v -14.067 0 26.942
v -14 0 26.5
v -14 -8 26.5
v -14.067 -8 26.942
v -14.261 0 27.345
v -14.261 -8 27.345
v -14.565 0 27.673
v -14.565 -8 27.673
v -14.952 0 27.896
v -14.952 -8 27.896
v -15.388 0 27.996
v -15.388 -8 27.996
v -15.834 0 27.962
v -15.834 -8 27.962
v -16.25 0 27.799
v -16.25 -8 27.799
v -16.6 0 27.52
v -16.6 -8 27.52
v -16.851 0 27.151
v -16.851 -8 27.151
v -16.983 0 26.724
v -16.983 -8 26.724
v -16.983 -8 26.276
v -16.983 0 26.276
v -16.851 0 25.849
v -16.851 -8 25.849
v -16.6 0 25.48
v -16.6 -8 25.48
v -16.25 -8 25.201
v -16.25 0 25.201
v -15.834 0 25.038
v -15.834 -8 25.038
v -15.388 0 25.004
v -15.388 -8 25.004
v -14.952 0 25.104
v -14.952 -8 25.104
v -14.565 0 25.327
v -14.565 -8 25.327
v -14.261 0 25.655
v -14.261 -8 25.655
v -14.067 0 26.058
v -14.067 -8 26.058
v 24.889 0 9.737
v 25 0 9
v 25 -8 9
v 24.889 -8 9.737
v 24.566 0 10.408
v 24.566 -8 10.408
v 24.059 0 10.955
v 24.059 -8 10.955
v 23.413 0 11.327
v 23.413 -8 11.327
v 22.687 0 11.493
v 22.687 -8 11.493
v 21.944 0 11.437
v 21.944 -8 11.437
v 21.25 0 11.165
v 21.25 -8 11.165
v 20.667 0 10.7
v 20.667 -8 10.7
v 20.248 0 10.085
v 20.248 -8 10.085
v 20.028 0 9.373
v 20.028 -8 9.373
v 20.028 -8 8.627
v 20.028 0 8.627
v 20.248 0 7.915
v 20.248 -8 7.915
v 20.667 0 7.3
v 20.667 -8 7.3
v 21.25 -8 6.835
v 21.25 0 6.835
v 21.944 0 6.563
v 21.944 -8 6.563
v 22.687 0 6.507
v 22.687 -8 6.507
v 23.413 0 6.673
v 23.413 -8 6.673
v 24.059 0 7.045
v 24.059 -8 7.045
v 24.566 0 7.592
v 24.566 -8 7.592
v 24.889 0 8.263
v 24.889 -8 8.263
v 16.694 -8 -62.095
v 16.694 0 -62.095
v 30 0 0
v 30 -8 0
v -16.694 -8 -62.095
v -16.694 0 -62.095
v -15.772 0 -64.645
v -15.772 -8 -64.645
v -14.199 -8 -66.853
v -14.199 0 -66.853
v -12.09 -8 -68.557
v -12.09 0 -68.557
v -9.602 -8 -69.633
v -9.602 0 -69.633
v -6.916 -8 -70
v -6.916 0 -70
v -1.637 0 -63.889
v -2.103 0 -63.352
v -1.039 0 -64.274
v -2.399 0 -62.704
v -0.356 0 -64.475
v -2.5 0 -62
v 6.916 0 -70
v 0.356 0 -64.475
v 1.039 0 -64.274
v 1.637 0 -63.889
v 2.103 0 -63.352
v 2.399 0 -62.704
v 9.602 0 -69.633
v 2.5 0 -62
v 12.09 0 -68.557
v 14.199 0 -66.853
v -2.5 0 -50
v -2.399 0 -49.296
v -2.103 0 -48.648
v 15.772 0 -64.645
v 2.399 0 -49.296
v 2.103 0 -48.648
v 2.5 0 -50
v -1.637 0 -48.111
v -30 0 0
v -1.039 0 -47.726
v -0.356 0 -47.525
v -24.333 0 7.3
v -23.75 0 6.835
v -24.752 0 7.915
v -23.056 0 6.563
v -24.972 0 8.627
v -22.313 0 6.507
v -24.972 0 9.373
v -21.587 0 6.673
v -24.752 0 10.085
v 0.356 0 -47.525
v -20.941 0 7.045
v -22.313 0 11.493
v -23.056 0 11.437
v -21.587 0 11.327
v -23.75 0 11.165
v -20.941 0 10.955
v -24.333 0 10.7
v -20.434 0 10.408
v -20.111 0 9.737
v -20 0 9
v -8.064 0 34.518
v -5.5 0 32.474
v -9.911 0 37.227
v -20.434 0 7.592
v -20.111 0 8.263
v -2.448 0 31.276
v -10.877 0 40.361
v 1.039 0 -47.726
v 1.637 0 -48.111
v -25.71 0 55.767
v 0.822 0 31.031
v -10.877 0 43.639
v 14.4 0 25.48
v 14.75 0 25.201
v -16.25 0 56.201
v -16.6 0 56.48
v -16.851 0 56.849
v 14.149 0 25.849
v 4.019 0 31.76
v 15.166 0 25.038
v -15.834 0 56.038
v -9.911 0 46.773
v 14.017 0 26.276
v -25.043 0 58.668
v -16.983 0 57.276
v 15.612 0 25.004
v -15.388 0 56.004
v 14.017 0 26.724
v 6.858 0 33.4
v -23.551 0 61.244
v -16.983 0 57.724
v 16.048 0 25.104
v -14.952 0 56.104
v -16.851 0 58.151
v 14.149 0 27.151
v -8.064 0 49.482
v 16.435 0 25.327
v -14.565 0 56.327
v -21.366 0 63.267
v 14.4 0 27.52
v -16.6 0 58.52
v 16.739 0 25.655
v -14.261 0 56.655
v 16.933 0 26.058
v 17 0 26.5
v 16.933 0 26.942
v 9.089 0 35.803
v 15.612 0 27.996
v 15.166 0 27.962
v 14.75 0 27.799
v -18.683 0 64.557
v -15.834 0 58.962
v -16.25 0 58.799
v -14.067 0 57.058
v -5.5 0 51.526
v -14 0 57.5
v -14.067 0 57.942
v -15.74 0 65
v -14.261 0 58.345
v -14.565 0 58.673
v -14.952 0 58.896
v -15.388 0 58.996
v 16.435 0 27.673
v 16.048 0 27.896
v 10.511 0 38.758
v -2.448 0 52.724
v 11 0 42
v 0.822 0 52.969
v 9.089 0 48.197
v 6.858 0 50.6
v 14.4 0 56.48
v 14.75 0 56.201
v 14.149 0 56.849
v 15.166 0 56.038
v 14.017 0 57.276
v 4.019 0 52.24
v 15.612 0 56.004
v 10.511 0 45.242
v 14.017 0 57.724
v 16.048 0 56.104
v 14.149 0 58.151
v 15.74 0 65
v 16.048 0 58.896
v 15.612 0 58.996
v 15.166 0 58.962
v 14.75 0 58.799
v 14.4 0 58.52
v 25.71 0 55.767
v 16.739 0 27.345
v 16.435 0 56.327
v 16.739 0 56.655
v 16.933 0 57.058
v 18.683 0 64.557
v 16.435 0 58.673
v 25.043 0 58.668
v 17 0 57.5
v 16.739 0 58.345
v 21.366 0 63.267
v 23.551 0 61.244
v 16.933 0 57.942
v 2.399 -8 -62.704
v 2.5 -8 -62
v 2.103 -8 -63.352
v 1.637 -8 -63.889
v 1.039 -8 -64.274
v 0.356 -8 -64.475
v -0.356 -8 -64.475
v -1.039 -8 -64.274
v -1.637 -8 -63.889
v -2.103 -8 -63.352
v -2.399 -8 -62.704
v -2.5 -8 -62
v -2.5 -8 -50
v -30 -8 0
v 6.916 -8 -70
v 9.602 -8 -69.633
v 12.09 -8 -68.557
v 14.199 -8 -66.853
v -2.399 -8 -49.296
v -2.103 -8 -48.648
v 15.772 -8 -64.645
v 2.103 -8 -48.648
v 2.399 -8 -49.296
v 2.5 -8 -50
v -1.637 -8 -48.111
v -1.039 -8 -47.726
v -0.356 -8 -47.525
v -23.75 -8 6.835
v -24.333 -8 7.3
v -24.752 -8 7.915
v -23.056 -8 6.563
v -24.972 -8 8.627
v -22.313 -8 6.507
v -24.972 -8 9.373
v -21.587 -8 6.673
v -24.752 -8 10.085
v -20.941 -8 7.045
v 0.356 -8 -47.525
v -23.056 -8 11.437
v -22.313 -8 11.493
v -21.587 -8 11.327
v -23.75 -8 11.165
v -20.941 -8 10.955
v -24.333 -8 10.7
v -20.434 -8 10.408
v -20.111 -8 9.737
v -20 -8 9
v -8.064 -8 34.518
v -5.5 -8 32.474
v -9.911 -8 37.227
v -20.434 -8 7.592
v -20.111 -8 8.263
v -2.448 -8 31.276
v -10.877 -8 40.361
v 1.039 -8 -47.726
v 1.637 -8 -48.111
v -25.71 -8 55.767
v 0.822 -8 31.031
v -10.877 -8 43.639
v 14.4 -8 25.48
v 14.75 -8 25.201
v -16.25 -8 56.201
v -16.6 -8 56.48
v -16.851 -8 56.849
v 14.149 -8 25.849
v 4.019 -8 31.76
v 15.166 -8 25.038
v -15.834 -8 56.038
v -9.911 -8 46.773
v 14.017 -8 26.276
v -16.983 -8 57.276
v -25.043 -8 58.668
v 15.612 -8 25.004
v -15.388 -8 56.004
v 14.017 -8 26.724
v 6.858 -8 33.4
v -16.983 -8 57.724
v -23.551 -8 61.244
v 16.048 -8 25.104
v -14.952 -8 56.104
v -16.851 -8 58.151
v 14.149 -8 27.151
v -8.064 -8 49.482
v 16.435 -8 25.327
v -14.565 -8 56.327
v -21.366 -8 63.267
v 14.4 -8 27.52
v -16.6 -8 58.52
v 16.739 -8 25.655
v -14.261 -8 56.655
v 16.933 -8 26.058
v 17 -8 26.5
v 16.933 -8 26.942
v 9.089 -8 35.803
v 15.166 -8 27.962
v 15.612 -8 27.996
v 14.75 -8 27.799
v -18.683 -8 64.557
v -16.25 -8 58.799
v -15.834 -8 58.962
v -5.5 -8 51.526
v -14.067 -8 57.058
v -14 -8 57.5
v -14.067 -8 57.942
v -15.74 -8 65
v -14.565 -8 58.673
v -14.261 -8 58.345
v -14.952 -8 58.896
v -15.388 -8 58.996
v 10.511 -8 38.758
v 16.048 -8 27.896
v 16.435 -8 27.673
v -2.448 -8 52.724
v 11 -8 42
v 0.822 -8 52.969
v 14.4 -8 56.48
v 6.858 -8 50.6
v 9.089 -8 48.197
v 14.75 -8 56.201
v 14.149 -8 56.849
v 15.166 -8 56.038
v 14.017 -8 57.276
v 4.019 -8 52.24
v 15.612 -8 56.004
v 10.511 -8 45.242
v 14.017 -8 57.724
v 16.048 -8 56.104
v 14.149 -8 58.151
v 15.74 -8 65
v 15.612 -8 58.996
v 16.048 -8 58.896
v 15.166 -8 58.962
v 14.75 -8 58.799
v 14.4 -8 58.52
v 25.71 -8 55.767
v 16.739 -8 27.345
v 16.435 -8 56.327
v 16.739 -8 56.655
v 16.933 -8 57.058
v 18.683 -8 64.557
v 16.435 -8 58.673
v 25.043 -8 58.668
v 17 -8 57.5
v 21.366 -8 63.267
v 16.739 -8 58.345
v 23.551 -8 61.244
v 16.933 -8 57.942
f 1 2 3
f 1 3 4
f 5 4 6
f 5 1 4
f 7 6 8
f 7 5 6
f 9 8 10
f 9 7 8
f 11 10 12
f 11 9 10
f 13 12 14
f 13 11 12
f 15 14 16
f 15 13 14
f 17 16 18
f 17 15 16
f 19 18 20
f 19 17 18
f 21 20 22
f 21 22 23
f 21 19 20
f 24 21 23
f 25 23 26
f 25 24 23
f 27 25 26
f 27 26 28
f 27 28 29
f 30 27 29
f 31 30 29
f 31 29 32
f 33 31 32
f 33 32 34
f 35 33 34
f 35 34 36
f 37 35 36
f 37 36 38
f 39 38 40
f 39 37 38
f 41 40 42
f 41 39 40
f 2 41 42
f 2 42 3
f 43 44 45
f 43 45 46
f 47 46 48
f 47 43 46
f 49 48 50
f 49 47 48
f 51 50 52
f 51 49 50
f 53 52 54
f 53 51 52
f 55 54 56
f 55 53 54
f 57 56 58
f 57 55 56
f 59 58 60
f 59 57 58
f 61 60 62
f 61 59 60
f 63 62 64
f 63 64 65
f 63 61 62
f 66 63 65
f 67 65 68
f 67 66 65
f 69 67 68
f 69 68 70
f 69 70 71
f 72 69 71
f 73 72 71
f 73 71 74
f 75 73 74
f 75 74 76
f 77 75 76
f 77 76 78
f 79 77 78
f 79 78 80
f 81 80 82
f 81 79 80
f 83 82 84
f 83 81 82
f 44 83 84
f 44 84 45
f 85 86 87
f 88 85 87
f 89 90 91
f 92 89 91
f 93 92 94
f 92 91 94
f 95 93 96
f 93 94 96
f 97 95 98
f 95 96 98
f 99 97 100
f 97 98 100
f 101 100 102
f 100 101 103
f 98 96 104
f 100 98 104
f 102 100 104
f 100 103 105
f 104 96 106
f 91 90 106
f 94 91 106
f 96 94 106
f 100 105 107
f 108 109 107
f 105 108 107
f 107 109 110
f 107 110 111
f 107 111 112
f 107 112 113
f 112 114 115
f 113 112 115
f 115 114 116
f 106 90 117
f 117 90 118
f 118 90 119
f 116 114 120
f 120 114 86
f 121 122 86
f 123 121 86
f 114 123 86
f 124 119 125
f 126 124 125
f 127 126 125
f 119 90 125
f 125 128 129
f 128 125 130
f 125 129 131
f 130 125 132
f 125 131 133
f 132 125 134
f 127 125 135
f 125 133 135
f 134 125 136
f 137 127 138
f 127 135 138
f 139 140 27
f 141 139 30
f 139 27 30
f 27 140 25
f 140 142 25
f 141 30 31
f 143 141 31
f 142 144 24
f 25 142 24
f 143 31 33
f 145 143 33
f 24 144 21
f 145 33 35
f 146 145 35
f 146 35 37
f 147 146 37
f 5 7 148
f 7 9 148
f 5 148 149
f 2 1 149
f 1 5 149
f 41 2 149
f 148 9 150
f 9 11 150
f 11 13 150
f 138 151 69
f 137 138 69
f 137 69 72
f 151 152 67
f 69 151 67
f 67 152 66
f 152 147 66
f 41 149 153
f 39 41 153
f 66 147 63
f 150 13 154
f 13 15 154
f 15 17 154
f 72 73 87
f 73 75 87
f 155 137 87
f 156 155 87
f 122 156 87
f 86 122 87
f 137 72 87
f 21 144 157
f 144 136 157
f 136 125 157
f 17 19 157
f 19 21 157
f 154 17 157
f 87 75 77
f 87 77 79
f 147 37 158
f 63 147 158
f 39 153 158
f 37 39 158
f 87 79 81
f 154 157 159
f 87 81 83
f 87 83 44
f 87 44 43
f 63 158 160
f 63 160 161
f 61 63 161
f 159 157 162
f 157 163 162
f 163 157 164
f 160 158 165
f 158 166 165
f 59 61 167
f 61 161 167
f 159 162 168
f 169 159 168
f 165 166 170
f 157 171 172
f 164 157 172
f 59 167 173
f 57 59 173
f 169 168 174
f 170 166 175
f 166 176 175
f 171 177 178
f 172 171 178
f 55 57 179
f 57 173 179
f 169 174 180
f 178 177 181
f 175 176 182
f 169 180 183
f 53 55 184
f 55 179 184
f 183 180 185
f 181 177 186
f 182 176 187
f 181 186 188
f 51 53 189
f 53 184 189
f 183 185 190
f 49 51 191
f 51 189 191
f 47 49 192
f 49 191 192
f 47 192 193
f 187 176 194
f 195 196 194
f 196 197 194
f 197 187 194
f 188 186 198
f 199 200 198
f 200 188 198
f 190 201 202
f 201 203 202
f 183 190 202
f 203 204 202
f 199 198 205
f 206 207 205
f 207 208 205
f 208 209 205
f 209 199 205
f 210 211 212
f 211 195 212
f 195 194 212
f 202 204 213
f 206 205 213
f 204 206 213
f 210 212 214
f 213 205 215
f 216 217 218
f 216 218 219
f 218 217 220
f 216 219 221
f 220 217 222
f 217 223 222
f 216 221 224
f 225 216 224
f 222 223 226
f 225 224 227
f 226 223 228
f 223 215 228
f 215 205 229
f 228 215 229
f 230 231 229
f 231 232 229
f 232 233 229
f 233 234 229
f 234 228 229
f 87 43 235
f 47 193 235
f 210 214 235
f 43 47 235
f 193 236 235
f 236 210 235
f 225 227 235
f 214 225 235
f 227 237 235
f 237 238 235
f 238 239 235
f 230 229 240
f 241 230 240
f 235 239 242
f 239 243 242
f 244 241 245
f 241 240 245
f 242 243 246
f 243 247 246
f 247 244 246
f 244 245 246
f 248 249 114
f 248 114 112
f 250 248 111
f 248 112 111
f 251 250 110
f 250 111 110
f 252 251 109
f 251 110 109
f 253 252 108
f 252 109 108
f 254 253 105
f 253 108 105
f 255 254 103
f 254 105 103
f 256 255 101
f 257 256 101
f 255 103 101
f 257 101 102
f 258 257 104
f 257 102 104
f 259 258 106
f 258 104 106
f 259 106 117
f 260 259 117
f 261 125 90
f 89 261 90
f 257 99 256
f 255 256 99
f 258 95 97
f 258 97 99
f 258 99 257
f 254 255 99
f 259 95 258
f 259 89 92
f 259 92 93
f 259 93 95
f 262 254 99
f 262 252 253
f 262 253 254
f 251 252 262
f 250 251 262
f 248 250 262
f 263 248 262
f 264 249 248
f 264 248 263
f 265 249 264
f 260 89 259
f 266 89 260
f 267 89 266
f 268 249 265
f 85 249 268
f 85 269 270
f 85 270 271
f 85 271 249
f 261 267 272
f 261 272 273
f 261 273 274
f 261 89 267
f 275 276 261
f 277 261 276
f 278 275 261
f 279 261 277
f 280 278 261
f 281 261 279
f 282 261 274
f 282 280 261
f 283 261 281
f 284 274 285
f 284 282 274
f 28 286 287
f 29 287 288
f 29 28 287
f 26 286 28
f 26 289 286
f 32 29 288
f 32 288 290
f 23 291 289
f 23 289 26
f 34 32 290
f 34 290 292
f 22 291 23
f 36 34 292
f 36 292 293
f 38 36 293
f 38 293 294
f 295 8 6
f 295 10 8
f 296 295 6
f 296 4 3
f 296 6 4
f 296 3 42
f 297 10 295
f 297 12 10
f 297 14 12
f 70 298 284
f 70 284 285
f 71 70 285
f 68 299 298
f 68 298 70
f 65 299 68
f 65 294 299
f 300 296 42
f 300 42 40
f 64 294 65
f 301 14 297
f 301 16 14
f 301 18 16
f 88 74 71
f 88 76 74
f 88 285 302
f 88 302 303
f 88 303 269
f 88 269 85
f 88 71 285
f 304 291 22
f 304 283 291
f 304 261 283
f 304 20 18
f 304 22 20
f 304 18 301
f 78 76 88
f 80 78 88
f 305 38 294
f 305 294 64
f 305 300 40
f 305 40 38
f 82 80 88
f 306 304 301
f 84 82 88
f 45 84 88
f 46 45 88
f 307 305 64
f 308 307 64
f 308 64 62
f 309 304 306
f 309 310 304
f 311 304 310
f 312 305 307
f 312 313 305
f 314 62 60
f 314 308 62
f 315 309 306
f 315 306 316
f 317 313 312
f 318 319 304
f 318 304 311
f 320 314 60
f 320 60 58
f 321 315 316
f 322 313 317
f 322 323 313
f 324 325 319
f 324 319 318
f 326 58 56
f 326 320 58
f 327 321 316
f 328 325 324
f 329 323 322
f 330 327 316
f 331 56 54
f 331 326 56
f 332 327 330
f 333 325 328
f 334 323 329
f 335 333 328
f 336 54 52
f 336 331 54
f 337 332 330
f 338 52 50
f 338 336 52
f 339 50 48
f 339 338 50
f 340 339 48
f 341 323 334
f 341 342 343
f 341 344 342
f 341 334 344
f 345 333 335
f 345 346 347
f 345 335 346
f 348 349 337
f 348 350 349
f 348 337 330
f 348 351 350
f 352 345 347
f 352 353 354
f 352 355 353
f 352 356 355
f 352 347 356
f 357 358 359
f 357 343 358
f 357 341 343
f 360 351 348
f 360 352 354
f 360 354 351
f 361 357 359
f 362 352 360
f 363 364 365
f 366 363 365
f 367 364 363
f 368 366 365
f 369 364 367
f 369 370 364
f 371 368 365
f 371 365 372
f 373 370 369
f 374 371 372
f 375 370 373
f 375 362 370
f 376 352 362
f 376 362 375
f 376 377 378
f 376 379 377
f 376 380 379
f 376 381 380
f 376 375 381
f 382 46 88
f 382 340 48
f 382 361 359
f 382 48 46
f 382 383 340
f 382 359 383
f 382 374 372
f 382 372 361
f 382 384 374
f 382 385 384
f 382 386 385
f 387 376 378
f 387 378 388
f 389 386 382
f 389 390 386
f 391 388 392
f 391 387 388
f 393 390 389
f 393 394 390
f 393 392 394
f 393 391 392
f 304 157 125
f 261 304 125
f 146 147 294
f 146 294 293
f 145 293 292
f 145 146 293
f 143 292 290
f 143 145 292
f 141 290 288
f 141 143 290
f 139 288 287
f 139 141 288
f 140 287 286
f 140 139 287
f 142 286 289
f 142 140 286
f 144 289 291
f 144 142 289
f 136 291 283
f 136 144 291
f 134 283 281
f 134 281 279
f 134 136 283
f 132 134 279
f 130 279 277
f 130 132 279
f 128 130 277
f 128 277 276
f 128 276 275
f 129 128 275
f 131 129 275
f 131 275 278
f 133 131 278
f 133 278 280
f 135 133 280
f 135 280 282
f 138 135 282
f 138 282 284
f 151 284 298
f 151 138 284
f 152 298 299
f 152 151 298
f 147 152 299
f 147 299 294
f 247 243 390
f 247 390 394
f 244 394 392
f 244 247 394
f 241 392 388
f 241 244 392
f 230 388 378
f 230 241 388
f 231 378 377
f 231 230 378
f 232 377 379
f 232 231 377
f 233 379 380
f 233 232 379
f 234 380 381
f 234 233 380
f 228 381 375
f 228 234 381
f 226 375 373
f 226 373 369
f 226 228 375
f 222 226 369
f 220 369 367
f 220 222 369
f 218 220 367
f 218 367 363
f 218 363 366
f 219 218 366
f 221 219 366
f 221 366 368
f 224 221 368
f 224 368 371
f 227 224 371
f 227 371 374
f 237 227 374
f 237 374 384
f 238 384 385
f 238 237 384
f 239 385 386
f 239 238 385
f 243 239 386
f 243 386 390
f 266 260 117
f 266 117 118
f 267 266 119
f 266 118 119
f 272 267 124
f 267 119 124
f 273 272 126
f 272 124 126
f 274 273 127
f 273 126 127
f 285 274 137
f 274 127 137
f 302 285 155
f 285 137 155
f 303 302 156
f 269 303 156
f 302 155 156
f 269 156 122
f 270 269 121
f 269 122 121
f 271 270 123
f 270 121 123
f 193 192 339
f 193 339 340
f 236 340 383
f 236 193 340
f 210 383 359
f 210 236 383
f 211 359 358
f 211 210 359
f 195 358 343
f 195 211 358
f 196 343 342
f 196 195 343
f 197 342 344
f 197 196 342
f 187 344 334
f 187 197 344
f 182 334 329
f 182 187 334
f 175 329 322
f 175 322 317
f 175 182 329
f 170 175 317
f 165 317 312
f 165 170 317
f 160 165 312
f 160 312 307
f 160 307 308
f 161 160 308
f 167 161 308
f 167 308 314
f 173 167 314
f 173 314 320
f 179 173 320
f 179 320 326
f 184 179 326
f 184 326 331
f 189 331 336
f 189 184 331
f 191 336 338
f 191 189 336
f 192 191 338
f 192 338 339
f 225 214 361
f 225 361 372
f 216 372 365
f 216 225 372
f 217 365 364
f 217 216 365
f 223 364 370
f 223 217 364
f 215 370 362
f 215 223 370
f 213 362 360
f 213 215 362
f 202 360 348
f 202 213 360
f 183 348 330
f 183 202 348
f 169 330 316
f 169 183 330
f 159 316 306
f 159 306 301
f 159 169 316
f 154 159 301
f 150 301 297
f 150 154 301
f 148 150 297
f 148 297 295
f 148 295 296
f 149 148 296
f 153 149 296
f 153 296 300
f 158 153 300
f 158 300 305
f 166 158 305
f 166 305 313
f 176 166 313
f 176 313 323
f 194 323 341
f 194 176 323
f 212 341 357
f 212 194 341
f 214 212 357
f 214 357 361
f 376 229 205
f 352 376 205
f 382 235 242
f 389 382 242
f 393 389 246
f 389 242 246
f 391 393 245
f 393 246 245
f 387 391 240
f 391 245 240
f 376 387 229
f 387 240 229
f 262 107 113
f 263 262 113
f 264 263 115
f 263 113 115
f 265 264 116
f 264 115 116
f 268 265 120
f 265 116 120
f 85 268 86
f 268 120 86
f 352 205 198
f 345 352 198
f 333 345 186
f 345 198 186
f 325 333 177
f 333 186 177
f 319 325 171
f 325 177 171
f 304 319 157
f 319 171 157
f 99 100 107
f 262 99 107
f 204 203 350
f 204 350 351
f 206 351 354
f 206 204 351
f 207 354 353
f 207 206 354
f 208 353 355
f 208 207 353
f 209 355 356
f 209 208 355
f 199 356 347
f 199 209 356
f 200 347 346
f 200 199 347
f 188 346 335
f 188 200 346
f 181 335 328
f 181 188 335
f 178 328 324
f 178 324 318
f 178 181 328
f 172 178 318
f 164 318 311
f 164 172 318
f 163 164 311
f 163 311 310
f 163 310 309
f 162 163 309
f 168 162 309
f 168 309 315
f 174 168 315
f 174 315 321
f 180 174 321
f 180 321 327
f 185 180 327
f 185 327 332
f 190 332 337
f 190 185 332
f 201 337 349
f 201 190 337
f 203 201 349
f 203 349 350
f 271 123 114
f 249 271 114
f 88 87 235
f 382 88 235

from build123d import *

# Parameters (mm, degrees)
F0_R     = 2.5
F0_R_2   = 1.5
F0_R_3   = 11
F2_DEPTH = 8


with BuildPart() as f2:
    # F0 (on Front) → F2 (new body)
    with BuildSketch(Plane.XZ):
        with BuildLine():
            Line((15.7396886074, 65), (0, 65))
            Line((0, 65), (-15.7396886074, 65))
            ThreePointArc((-15.7396886074, 65), (-22.5341845457, 62.3372218819), (-25.7102334624, 55.7669649888))
            Line((-25.7102334624, 55.7669649888), (-30, 0))
            Line((-30, 0), (-16.6938662384, -62.0952908873))
            ThreePointArc((-16.6938662384, -62.0952908873), (-13.202617548, -67.7766608796), (-6.9158420977, -70))
            Line((-6.9158420977, -70), (0, -70))
            Line((0, -70), (6.9158420977, -70))
            ThreePointArc((6.9158420977, -70), (13.202617548, -67.7766608796), (16.6938662384, -62.0952908873))
            Line((16.6938662384, -62.0952908873), (30, 0))
            Line((30, 0), (25.7102334624, 55.7669649888))
            ThreePointArc((25.7102334624, 55.7669649888), (22.5341845457, 62.3372218819), (15.7396886074, 65))
        make_face()
        with BuildLine():
            Line((-2.5, -62), (-2.5, -50))
            ThreePointArc((-2.5, -50), (0, -47.5), (2.5, -50))
            Line((2.5, -50), (2.5, -62))
            ThreePointArc((2.5, -62), (0, -64.5), (-2.5, -62))
        make_face(mode=Mode.SUBTRACT)
        with Locations((-22.5, 9)):
            Circle(F0_R, mode=Mode.SUBTRACT)
        with Locations((-15.5, 26.5)):
            Circle(F0_R_2, mode=Mode.SUBTRACT)
        with Locations((-15.5, 57.5)):
            Circle(F0_R_2, mode=Mode.SUBTRACT)
        with Locations((22.5, 9)):
            Circle(F0_R, mode=Mode.SUBTRACT)
        with Locations((15.5, 26.5)):
            Circle(F0_R_2, mode=Mode.SUBTRACT)
        with Locations((0, 42)):
            Circle(F0_R_3, mode=Mode.SUBTRACT)
        with Locations((15.5, 57.5)):
            Circle(F0_R_2, mode=Mode.SUBTRACT)
    extrude(amount=F2_DEPTH)


solid = f2.part
